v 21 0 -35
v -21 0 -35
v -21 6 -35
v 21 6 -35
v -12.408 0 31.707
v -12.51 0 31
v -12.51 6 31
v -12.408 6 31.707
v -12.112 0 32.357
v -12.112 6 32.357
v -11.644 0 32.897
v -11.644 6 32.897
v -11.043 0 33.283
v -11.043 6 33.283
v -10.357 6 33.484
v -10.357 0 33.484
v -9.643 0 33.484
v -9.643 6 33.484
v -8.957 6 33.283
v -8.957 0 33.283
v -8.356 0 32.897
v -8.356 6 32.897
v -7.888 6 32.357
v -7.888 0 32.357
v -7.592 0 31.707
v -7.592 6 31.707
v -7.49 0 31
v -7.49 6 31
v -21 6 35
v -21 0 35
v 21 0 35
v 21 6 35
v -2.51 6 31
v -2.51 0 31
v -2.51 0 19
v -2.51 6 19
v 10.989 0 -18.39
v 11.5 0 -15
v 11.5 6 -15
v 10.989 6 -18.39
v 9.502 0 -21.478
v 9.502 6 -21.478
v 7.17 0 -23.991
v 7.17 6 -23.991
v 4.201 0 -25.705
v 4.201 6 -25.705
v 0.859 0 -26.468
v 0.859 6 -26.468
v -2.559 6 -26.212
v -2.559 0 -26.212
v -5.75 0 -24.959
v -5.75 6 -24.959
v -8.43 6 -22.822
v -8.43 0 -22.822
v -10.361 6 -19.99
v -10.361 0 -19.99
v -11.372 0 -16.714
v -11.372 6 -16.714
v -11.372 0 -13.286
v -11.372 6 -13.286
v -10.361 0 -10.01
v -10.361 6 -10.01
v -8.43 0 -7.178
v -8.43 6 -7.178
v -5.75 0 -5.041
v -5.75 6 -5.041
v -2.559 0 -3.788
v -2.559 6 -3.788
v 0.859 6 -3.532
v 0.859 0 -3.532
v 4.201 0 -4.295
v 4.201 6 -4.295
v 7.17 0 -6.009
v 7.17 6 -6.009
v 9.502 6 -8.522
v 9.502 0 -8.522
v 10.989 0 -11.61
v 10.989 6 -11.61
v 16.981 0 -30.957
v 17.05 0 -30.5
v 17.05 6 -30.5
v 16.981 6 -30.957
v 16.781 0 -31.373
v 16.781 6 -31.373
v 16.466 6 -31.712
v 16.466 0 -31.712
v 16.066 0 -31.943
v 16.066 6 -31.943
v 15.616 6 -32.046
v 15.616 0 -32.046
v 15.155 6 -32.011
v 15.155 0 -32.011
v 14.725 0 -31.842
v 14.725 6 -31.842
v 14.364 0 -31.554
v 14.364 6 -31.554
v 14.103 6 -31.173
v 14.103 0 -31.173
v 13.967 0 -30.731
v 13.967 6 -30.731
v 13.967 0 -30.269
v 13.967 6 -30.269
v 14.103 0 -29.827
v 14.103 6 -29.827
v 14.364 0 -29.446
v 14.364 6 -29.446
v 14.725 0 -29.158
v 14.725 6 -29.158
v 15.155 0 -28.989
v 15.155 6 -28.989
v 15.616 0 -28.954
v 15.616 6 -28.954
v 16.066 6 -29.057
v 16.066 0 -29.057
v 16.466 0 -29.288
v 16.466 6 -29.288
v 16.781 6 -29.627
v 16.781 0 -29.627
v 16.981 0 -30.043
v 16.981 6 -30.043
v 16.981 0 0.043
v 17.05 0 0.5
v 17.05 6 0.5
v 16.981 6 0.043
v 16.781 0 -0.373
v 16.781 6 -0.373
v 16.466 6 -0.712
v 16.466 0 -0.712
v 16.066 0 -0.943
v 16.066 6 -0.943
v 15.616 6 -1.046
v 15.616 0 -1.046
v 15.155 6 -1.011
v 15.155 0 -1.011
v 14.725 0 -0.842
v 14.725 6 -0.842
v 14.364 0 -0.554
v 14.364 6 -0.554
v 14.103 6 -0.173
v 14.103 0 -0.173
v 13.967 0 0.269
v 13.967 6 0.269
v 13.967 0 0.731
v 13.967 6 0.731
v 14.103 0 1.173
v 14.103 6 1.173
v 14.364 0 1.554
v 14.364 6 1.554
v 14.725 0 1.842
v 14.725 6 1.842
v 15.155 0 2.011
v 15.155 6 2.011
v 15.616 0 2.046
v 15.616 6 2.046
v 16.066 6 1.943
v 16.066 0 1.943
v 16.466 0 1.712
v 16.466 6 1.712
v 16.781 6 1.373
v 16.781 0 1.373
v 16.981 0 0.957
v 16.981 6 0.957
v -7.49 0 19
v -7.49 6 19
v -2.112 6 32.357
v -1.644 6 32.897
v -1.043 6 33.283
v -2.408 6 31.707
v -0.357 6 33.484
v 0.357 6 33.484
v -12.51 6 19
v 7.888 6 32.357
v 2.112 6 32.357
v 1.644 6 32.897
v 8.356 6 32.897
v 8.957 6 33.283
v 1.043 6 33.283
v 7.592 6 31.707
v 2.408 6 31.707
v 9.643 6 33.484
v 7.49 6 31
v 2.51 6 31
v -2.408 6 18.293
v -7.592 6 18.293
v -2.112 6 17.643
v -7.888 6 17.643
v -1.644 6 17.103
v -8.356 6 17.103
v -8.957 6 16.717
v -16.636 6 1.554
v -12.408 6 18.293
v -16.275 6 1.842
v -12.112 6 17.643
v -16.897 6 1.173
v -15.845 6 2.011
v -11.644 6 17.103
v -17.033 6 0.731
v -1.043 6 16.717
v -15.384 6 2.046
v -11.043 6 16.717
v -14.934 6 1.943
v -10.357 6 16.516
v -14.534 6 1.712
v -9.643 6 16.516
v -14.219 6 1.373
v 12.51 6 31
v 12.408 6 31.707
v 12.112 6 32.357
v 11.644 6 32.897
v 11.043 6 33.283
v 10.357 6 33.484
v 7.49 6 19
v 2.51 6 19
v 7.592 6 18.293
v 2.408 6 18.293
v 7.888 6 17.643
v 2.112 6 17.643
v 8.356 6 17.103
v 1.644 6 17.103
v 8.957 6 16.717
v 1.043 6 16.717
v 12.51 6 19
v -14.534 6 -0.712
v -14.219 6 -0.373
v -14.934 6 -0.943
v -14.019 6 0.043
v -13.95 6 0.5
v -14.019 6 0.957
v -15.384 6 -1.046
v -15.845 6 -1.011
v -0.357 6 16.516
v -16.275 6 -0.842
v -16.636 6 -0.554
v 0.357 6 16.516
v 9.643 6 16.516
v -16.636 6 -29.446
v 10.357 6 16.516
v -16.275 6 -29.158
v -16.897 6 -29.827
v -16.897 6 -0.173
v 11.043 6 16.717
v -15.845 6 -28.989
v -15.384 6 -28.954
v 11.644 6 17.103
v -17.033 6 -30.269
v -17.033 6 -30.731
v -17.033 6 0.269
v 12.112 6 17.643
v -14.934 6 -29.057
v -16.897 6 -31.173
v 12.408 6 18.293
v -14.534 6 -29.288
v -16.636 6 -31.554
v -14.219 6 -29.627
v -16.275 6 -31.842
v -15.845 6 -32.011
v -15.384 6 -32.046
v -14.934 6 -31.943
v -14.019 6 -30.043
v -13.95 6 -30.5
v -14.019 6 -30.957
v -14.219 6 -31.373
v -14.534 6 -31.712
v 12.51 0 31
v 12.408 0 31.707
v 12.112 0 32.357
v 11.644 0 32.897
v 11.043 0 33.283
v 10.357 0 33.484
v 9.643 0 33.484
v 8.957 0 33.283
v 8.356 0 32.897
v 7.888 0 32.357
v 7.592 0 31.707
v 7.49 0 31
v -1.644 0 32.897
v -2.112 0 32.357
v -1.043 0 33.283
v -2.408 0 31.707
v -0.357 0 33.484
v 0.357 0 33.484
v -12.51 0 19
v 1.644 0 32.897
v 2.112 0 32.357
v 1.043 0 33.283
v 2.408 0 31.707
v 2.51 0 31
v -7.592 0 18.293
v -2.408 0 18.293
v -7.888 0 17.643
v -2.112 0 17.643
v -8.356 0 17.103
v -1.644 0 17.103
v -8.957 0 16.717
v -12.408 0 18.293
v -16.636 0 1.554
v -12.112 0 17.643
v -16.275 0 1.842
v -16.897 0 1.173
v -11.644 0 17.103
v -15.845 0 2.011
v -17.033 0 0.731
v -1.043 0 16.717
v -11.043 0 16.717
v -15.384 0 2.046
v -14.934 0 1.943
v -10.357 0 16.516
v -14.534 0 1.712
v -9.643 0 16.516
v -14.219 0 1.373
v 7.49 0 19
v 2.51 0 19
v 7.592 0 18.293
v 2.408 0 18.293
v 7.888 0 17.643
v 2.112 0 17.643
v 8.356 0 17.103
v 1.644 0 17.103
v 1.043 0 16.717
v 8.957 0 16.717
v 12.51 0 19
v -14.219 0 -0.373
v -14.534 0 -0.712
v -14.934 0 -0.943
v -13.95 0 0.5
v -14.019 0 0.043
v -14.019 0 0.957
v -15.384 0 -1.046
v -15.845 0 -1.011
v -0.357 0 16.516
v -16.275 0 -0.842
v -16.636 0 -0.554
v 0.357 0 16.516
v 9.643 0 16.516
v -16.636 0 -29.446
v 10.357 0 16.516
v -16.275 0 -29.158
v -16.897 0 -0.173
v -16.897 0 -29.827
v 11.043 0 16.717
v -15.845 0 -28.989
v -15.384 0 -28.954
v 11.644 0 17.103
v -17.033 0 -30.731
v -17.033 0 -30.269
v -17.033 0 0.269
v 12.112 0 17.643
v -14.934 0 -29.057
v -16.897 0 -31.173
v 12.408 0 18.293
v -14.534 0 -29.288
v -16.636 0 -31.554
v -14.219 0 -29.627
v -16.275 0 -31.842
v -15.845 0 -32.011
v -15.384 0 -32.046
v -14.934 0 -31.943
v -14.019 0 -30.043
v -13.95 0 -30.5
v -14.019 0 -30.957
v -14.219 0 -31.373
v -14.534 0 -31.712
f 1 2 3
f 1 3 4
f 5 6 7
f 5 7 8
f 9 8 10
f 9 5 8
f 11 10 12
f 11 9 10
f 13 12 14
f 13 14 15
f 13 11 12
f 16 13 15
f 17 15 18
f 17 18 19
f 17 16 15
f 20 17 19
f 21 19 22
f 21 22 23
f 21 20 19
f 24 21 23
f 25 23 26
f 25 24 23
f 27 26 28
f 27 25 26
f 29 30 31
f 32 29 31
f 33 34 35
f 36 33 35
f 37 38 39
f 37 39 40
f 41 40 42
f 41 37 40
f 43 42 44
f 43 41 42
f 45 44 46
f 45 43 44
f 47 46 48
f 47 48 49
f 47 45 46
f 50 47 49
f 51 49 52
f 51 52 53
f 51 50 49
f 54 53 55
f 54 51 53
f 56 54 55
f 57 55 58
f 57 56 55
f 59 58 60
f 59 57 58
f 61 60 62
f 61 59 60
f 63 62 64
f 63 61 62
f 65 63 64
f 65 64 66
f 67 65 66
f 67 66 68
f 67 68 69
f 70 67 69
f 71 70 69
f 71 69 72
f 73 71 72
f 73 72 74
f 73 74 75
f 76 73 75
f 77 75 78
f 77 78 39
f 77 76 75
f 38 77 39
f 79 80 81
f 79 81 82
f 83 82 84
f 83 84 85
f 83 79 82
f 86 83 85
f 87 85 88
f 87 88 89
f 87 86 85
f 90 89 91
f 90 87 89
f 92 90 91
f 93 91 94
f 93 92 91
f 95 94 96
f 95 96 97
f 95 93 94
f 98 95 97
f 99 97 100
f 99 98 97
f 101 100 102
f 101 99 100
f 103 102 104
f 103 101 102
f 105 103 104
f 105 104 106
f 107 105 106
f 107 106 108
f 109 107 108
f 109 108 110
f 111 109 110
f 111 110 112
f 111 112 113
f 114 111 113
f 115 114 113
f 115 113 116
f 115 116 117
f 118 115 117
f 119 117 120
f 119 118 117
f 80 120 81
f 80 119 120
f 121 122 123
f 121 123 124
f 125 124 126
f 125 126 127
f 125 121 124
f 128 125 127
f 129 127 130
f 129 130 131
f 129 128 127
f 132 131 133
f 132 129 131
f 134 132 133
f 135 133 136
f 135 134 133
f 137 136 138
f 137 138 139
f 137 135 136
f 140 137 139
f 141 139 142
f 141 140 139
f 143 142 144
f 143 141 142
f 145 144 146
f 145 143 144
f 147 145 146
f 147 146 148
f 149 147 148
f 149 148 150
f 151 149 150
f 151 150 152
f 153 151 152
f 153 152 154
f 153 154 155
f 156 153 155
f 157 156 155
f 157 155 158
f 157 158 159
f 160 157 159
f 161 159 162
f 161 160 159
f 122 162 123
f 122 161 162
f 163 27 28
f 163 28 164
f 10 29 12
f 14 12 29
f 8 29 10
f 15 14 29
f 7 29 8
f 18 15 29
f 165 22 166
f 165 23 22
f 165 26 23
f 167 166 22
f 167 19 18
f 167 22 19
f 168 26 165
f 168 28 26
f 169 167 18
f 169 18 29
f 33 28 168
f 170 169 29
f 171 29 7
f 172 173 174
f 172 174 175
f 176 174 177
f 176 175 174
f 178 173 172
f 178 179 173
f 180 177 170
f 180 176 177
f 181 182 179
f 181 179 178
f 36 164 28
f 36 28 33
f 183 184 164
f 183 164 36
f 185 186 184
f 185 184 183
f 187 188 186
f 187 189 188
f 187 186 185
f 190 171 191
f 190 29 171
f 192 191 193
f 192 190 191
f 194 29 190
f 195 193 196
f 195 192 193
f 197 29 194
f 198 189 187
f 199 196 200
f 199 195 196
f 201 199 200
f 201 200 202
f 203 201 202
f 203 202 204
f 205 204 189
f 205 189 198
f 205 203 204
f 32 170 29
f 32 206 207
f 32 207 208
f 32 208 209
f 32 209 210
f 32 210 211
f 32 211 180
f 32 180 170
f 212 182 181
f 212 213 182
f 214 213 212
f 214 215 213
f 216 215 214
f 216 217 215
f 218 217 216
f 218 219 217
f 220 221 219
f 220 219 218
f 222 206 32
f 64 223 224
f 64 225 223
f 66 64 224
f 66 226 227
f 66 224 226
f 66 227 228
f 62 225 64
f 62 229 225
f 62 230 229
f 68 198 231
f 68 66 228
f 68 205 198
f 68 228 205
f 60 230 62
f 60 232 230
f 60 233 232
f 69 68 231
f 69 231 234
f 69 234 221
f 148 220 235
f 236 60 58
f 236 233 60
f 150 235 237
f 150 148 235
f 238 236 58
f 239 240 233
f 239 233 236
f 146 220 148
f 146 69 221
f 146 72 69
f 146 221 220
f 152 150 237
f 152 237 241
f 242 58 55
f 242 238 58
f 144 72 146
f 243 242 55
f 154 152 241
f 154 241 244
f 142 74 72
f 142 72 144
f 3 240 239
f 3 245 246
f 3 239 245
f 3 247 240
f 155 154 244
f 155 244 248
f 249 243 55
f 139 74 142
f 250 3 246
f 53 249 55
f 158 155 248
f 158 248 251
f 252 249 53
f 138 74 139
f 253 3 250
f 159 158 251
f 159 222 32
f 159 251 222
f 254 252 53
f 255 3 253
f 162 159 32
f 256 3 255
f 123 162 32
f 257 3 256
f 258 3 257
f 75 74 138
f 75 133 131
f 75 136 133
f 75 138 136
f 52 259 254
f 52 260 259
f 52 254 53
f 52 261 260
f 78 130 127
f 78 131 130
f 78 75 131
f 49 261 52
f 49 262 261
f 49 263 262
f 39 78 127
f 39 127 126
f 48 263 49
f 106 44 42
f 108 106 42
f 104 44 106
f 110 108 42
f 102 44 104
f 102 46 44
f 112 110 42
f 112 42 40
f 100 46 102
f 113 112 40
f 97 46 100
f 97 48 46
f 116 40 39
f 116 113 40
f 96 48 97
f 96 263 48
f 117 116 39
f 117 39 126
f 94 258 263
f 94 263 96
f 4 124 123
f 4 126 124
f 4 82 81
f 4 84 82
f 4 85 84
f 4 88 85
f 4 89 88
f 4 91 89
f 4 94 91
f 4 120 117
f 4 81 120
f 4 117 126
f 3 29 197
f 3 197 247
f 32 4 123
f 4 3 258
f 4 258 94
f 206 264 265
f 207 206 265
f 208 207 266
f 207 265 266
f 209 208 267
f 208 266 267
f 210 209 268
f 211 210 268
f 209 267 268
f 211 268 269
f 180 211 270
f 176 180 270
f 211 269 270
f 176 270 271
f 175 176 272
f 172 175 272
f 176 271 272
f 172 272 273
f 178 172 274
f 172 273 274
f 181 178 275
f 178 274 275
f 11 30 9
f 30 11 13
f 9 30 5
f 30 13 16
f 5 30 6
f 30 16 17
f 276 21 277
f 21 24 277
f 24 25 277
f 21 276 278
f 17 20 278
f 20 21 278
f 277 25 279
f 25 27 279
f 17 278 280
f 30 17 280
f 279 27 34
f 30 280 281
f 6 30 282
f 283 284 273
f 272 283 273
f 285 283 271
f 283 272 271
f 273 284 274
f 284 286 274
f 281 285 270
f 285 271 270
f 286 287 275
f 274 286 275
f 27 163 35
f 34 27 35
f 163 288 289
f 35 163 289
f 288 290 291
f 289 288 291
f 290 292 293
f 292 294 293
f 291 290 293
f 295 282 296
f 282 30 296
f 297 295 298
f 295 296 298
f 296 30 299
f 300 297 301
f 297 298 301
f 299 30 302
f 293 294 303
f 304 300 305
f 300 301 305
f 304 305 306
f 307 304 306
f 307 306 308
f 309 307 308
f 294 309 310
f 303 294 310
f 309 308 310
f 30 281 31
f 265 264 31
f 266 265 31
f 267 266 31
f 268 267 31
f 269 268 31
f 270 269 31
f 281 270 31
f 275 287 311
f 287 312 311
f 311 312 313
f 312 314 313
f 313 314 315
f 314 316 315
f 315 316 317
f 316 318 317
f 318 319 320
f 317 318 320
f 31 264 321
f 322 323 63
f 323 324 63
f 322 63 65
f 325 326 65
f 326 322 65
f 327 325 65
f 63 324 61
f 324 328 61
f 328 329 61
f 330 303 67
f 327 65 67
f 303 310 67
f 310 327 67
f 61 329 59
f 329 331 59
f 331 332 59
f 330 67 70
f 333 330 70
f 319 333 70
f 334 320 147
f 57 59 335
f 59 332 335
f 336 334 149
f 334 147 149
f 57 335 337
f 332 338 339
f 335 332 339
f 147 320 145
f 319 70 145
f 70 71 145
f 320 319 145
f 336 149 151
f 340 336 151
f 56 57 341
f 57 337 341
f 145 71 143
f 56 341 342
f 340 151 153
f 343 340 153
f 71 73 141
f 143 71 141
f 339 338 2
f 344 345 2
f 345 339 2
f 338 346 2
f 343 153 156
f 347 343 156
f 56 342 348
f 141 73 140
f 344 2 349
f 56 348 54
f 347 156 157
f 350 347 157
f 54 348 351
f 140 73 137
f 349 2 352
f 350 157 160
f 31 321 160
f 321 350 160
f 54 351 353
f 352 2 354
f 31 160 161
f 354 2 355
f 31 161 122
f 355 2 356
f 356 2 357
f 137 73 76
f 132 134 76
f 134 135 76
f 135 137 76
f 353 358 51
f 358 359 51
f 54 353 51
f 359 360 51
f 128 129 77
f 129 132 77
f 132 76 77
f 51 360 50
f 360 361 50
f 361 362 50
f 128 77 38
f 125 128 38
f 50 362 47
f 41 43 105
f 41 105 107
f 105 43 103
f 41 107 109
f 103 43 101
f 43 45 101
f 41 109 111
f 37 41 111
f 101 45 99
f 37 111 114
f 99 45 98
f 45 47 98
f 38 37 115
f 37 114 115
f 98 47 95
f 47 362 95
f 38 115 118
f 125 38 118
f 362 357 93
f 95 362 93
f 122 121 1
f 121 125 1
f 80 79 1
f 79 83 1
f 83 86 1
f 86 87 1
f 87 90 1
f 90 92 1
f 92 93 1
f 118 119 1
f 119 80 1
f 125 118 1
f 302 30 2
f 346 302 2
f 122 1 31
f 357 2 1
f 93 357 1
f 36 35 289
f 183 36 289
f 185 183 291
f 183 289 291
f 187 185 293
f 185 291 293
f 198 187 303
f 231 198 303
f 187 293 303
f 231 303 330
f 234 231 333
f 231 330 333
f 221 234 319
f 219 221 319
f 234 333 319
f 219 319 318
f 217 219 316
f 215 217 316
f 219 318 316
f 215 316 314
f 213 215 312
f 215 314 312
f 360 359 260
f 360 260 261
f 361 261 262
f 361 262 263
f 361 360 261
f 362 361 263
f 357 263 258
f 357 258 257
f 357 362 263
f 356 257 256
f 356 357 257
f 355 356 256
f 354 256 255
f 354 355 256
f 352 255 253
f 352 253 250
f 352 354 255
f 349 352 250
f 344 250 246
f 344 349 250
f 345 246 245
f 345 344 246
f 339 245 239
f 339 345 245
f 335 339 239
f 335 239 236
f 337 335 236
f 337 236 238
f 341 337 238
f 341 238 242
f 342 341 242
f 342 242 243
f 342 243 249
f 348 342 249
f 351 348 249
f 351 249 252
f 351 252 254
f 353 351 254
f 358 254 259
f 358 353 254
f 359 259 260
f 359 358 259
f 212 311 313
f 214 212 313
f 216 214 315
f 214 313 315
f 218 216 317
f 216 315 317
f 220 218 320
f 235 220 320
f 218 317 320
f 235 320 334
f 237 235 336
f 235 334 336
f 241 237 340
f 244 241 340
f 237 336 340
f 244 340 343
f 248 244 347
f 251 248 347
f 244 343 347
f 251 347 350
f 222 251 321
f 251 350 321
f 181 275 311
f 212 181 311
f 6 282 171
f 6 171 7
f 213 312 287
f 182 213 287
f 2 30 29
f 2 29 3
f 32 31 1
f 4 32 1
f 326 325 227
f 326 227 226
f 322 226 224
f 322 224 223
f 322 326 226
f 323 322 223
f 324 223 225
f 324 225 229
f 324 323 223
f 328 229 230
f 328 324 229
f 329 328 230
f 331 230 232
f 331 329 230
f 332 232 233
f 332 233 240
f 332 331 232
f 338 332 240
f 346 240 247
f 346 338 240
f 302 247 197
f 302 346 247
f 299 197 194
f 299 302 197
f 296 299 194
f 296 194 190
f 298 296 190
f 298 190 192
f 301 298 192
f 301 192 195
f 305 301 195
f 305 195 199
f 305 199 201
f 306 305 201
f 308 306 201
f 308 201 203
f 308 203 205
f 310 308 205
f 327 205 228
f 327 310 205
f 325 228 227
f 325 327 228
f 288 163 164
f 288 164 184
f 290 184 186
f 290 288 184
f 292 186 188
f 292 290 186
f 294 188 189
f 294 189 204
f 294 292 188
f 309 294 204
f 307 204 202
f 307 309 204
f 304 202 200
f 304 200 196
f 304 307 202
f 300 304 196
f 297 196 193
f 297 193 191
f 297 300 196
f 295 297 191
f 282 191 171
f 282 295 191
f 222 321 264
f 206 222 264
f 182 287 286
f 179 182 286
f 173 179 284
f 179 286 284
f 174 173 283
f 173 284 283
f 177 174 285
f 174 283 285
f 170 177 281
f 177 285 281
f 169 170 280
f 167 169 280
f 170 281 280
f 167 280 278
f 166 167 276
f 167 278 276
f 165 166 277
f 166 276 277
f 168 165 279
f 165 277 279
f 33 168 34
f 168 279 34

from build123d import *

# Parameters (mm, degrees)
SKETCH1_W           = 42
SKETCH1_H           = 70
SKETCH1_R           = 11.5
SKETCH1_R_2         = 1.55
BOSS_EXTRUDE1_DEPTH = 6


with BuildPart() as part:
    # Sketch1 → Boss-Extrude1 (new body)
    with BuildSketch(Plane(origin=(0, 0, 0), x_dir=(1, 0, 0), z_dir=(0, 1, 0))):
        Rectangle(SKETCH1_W, SKETCH1_H)
        with Locations((0, 15)):
            Circle(SKETCH1_R, mode=Mode.SUBTRACT)
        with Locations((-15.5, 30.5)):
            Circle(SKETCH1_R_2, mode=Mode.SUBTRACT)
        with Locations((15.5, 30.5)):
            Circle(SKETCH1_R_2, mode=Mode.SUBTRACT)
        with Locations((15.5, -0.5)):
            Circle(SKETCH1_R_2, mode=Mode.SUBTRACT)
        with Locations((-15.5, -0.5)):
            Circle(SKETCH1_R_2, mode=Mode.SUBTRACT)
        with BuildLine():
            Line((-7.49, -31), (-7.49, -19))
            ThreePointArc((-7.49, -19), (-10, -16.49), (-12.51, -19))
            Line((-12.51, -19), (-12.51, -31))
            ThreePointArc((-12.51, -31), (-10, -33.51), (-7.49, -31))
        make_face(mode=Mode.SUBTRACT)
        with BuildLine():
            Line((-2.51, -31), (-2.51, -19))
            ThreePointArc((-2.51, -19), (0, -16.49), (2.51, -19))
            Line((2.51, -19), (2.51, -31))
            ThreePointArc((2.51, -31), (0, -33.51), (-2.51, -31))
        make_face(mode=Mode.SUBTRACT)
        with BuildLine():
            Line((7.49, -31), (7.49, -19))
            ThreePointArc((7.49, -19), (10, -16.49), (12.51, -19))
            Line((12.51, -19), (12.51, -31))
            ThreePointArc((12.51, -31), (10, -33.51), (7.49, -31))
        make_face(mode=Mode.SUBTRACT)
    extrude(amount=BOSS_EXTRUDE1_DEPTH)


solid = part.part
